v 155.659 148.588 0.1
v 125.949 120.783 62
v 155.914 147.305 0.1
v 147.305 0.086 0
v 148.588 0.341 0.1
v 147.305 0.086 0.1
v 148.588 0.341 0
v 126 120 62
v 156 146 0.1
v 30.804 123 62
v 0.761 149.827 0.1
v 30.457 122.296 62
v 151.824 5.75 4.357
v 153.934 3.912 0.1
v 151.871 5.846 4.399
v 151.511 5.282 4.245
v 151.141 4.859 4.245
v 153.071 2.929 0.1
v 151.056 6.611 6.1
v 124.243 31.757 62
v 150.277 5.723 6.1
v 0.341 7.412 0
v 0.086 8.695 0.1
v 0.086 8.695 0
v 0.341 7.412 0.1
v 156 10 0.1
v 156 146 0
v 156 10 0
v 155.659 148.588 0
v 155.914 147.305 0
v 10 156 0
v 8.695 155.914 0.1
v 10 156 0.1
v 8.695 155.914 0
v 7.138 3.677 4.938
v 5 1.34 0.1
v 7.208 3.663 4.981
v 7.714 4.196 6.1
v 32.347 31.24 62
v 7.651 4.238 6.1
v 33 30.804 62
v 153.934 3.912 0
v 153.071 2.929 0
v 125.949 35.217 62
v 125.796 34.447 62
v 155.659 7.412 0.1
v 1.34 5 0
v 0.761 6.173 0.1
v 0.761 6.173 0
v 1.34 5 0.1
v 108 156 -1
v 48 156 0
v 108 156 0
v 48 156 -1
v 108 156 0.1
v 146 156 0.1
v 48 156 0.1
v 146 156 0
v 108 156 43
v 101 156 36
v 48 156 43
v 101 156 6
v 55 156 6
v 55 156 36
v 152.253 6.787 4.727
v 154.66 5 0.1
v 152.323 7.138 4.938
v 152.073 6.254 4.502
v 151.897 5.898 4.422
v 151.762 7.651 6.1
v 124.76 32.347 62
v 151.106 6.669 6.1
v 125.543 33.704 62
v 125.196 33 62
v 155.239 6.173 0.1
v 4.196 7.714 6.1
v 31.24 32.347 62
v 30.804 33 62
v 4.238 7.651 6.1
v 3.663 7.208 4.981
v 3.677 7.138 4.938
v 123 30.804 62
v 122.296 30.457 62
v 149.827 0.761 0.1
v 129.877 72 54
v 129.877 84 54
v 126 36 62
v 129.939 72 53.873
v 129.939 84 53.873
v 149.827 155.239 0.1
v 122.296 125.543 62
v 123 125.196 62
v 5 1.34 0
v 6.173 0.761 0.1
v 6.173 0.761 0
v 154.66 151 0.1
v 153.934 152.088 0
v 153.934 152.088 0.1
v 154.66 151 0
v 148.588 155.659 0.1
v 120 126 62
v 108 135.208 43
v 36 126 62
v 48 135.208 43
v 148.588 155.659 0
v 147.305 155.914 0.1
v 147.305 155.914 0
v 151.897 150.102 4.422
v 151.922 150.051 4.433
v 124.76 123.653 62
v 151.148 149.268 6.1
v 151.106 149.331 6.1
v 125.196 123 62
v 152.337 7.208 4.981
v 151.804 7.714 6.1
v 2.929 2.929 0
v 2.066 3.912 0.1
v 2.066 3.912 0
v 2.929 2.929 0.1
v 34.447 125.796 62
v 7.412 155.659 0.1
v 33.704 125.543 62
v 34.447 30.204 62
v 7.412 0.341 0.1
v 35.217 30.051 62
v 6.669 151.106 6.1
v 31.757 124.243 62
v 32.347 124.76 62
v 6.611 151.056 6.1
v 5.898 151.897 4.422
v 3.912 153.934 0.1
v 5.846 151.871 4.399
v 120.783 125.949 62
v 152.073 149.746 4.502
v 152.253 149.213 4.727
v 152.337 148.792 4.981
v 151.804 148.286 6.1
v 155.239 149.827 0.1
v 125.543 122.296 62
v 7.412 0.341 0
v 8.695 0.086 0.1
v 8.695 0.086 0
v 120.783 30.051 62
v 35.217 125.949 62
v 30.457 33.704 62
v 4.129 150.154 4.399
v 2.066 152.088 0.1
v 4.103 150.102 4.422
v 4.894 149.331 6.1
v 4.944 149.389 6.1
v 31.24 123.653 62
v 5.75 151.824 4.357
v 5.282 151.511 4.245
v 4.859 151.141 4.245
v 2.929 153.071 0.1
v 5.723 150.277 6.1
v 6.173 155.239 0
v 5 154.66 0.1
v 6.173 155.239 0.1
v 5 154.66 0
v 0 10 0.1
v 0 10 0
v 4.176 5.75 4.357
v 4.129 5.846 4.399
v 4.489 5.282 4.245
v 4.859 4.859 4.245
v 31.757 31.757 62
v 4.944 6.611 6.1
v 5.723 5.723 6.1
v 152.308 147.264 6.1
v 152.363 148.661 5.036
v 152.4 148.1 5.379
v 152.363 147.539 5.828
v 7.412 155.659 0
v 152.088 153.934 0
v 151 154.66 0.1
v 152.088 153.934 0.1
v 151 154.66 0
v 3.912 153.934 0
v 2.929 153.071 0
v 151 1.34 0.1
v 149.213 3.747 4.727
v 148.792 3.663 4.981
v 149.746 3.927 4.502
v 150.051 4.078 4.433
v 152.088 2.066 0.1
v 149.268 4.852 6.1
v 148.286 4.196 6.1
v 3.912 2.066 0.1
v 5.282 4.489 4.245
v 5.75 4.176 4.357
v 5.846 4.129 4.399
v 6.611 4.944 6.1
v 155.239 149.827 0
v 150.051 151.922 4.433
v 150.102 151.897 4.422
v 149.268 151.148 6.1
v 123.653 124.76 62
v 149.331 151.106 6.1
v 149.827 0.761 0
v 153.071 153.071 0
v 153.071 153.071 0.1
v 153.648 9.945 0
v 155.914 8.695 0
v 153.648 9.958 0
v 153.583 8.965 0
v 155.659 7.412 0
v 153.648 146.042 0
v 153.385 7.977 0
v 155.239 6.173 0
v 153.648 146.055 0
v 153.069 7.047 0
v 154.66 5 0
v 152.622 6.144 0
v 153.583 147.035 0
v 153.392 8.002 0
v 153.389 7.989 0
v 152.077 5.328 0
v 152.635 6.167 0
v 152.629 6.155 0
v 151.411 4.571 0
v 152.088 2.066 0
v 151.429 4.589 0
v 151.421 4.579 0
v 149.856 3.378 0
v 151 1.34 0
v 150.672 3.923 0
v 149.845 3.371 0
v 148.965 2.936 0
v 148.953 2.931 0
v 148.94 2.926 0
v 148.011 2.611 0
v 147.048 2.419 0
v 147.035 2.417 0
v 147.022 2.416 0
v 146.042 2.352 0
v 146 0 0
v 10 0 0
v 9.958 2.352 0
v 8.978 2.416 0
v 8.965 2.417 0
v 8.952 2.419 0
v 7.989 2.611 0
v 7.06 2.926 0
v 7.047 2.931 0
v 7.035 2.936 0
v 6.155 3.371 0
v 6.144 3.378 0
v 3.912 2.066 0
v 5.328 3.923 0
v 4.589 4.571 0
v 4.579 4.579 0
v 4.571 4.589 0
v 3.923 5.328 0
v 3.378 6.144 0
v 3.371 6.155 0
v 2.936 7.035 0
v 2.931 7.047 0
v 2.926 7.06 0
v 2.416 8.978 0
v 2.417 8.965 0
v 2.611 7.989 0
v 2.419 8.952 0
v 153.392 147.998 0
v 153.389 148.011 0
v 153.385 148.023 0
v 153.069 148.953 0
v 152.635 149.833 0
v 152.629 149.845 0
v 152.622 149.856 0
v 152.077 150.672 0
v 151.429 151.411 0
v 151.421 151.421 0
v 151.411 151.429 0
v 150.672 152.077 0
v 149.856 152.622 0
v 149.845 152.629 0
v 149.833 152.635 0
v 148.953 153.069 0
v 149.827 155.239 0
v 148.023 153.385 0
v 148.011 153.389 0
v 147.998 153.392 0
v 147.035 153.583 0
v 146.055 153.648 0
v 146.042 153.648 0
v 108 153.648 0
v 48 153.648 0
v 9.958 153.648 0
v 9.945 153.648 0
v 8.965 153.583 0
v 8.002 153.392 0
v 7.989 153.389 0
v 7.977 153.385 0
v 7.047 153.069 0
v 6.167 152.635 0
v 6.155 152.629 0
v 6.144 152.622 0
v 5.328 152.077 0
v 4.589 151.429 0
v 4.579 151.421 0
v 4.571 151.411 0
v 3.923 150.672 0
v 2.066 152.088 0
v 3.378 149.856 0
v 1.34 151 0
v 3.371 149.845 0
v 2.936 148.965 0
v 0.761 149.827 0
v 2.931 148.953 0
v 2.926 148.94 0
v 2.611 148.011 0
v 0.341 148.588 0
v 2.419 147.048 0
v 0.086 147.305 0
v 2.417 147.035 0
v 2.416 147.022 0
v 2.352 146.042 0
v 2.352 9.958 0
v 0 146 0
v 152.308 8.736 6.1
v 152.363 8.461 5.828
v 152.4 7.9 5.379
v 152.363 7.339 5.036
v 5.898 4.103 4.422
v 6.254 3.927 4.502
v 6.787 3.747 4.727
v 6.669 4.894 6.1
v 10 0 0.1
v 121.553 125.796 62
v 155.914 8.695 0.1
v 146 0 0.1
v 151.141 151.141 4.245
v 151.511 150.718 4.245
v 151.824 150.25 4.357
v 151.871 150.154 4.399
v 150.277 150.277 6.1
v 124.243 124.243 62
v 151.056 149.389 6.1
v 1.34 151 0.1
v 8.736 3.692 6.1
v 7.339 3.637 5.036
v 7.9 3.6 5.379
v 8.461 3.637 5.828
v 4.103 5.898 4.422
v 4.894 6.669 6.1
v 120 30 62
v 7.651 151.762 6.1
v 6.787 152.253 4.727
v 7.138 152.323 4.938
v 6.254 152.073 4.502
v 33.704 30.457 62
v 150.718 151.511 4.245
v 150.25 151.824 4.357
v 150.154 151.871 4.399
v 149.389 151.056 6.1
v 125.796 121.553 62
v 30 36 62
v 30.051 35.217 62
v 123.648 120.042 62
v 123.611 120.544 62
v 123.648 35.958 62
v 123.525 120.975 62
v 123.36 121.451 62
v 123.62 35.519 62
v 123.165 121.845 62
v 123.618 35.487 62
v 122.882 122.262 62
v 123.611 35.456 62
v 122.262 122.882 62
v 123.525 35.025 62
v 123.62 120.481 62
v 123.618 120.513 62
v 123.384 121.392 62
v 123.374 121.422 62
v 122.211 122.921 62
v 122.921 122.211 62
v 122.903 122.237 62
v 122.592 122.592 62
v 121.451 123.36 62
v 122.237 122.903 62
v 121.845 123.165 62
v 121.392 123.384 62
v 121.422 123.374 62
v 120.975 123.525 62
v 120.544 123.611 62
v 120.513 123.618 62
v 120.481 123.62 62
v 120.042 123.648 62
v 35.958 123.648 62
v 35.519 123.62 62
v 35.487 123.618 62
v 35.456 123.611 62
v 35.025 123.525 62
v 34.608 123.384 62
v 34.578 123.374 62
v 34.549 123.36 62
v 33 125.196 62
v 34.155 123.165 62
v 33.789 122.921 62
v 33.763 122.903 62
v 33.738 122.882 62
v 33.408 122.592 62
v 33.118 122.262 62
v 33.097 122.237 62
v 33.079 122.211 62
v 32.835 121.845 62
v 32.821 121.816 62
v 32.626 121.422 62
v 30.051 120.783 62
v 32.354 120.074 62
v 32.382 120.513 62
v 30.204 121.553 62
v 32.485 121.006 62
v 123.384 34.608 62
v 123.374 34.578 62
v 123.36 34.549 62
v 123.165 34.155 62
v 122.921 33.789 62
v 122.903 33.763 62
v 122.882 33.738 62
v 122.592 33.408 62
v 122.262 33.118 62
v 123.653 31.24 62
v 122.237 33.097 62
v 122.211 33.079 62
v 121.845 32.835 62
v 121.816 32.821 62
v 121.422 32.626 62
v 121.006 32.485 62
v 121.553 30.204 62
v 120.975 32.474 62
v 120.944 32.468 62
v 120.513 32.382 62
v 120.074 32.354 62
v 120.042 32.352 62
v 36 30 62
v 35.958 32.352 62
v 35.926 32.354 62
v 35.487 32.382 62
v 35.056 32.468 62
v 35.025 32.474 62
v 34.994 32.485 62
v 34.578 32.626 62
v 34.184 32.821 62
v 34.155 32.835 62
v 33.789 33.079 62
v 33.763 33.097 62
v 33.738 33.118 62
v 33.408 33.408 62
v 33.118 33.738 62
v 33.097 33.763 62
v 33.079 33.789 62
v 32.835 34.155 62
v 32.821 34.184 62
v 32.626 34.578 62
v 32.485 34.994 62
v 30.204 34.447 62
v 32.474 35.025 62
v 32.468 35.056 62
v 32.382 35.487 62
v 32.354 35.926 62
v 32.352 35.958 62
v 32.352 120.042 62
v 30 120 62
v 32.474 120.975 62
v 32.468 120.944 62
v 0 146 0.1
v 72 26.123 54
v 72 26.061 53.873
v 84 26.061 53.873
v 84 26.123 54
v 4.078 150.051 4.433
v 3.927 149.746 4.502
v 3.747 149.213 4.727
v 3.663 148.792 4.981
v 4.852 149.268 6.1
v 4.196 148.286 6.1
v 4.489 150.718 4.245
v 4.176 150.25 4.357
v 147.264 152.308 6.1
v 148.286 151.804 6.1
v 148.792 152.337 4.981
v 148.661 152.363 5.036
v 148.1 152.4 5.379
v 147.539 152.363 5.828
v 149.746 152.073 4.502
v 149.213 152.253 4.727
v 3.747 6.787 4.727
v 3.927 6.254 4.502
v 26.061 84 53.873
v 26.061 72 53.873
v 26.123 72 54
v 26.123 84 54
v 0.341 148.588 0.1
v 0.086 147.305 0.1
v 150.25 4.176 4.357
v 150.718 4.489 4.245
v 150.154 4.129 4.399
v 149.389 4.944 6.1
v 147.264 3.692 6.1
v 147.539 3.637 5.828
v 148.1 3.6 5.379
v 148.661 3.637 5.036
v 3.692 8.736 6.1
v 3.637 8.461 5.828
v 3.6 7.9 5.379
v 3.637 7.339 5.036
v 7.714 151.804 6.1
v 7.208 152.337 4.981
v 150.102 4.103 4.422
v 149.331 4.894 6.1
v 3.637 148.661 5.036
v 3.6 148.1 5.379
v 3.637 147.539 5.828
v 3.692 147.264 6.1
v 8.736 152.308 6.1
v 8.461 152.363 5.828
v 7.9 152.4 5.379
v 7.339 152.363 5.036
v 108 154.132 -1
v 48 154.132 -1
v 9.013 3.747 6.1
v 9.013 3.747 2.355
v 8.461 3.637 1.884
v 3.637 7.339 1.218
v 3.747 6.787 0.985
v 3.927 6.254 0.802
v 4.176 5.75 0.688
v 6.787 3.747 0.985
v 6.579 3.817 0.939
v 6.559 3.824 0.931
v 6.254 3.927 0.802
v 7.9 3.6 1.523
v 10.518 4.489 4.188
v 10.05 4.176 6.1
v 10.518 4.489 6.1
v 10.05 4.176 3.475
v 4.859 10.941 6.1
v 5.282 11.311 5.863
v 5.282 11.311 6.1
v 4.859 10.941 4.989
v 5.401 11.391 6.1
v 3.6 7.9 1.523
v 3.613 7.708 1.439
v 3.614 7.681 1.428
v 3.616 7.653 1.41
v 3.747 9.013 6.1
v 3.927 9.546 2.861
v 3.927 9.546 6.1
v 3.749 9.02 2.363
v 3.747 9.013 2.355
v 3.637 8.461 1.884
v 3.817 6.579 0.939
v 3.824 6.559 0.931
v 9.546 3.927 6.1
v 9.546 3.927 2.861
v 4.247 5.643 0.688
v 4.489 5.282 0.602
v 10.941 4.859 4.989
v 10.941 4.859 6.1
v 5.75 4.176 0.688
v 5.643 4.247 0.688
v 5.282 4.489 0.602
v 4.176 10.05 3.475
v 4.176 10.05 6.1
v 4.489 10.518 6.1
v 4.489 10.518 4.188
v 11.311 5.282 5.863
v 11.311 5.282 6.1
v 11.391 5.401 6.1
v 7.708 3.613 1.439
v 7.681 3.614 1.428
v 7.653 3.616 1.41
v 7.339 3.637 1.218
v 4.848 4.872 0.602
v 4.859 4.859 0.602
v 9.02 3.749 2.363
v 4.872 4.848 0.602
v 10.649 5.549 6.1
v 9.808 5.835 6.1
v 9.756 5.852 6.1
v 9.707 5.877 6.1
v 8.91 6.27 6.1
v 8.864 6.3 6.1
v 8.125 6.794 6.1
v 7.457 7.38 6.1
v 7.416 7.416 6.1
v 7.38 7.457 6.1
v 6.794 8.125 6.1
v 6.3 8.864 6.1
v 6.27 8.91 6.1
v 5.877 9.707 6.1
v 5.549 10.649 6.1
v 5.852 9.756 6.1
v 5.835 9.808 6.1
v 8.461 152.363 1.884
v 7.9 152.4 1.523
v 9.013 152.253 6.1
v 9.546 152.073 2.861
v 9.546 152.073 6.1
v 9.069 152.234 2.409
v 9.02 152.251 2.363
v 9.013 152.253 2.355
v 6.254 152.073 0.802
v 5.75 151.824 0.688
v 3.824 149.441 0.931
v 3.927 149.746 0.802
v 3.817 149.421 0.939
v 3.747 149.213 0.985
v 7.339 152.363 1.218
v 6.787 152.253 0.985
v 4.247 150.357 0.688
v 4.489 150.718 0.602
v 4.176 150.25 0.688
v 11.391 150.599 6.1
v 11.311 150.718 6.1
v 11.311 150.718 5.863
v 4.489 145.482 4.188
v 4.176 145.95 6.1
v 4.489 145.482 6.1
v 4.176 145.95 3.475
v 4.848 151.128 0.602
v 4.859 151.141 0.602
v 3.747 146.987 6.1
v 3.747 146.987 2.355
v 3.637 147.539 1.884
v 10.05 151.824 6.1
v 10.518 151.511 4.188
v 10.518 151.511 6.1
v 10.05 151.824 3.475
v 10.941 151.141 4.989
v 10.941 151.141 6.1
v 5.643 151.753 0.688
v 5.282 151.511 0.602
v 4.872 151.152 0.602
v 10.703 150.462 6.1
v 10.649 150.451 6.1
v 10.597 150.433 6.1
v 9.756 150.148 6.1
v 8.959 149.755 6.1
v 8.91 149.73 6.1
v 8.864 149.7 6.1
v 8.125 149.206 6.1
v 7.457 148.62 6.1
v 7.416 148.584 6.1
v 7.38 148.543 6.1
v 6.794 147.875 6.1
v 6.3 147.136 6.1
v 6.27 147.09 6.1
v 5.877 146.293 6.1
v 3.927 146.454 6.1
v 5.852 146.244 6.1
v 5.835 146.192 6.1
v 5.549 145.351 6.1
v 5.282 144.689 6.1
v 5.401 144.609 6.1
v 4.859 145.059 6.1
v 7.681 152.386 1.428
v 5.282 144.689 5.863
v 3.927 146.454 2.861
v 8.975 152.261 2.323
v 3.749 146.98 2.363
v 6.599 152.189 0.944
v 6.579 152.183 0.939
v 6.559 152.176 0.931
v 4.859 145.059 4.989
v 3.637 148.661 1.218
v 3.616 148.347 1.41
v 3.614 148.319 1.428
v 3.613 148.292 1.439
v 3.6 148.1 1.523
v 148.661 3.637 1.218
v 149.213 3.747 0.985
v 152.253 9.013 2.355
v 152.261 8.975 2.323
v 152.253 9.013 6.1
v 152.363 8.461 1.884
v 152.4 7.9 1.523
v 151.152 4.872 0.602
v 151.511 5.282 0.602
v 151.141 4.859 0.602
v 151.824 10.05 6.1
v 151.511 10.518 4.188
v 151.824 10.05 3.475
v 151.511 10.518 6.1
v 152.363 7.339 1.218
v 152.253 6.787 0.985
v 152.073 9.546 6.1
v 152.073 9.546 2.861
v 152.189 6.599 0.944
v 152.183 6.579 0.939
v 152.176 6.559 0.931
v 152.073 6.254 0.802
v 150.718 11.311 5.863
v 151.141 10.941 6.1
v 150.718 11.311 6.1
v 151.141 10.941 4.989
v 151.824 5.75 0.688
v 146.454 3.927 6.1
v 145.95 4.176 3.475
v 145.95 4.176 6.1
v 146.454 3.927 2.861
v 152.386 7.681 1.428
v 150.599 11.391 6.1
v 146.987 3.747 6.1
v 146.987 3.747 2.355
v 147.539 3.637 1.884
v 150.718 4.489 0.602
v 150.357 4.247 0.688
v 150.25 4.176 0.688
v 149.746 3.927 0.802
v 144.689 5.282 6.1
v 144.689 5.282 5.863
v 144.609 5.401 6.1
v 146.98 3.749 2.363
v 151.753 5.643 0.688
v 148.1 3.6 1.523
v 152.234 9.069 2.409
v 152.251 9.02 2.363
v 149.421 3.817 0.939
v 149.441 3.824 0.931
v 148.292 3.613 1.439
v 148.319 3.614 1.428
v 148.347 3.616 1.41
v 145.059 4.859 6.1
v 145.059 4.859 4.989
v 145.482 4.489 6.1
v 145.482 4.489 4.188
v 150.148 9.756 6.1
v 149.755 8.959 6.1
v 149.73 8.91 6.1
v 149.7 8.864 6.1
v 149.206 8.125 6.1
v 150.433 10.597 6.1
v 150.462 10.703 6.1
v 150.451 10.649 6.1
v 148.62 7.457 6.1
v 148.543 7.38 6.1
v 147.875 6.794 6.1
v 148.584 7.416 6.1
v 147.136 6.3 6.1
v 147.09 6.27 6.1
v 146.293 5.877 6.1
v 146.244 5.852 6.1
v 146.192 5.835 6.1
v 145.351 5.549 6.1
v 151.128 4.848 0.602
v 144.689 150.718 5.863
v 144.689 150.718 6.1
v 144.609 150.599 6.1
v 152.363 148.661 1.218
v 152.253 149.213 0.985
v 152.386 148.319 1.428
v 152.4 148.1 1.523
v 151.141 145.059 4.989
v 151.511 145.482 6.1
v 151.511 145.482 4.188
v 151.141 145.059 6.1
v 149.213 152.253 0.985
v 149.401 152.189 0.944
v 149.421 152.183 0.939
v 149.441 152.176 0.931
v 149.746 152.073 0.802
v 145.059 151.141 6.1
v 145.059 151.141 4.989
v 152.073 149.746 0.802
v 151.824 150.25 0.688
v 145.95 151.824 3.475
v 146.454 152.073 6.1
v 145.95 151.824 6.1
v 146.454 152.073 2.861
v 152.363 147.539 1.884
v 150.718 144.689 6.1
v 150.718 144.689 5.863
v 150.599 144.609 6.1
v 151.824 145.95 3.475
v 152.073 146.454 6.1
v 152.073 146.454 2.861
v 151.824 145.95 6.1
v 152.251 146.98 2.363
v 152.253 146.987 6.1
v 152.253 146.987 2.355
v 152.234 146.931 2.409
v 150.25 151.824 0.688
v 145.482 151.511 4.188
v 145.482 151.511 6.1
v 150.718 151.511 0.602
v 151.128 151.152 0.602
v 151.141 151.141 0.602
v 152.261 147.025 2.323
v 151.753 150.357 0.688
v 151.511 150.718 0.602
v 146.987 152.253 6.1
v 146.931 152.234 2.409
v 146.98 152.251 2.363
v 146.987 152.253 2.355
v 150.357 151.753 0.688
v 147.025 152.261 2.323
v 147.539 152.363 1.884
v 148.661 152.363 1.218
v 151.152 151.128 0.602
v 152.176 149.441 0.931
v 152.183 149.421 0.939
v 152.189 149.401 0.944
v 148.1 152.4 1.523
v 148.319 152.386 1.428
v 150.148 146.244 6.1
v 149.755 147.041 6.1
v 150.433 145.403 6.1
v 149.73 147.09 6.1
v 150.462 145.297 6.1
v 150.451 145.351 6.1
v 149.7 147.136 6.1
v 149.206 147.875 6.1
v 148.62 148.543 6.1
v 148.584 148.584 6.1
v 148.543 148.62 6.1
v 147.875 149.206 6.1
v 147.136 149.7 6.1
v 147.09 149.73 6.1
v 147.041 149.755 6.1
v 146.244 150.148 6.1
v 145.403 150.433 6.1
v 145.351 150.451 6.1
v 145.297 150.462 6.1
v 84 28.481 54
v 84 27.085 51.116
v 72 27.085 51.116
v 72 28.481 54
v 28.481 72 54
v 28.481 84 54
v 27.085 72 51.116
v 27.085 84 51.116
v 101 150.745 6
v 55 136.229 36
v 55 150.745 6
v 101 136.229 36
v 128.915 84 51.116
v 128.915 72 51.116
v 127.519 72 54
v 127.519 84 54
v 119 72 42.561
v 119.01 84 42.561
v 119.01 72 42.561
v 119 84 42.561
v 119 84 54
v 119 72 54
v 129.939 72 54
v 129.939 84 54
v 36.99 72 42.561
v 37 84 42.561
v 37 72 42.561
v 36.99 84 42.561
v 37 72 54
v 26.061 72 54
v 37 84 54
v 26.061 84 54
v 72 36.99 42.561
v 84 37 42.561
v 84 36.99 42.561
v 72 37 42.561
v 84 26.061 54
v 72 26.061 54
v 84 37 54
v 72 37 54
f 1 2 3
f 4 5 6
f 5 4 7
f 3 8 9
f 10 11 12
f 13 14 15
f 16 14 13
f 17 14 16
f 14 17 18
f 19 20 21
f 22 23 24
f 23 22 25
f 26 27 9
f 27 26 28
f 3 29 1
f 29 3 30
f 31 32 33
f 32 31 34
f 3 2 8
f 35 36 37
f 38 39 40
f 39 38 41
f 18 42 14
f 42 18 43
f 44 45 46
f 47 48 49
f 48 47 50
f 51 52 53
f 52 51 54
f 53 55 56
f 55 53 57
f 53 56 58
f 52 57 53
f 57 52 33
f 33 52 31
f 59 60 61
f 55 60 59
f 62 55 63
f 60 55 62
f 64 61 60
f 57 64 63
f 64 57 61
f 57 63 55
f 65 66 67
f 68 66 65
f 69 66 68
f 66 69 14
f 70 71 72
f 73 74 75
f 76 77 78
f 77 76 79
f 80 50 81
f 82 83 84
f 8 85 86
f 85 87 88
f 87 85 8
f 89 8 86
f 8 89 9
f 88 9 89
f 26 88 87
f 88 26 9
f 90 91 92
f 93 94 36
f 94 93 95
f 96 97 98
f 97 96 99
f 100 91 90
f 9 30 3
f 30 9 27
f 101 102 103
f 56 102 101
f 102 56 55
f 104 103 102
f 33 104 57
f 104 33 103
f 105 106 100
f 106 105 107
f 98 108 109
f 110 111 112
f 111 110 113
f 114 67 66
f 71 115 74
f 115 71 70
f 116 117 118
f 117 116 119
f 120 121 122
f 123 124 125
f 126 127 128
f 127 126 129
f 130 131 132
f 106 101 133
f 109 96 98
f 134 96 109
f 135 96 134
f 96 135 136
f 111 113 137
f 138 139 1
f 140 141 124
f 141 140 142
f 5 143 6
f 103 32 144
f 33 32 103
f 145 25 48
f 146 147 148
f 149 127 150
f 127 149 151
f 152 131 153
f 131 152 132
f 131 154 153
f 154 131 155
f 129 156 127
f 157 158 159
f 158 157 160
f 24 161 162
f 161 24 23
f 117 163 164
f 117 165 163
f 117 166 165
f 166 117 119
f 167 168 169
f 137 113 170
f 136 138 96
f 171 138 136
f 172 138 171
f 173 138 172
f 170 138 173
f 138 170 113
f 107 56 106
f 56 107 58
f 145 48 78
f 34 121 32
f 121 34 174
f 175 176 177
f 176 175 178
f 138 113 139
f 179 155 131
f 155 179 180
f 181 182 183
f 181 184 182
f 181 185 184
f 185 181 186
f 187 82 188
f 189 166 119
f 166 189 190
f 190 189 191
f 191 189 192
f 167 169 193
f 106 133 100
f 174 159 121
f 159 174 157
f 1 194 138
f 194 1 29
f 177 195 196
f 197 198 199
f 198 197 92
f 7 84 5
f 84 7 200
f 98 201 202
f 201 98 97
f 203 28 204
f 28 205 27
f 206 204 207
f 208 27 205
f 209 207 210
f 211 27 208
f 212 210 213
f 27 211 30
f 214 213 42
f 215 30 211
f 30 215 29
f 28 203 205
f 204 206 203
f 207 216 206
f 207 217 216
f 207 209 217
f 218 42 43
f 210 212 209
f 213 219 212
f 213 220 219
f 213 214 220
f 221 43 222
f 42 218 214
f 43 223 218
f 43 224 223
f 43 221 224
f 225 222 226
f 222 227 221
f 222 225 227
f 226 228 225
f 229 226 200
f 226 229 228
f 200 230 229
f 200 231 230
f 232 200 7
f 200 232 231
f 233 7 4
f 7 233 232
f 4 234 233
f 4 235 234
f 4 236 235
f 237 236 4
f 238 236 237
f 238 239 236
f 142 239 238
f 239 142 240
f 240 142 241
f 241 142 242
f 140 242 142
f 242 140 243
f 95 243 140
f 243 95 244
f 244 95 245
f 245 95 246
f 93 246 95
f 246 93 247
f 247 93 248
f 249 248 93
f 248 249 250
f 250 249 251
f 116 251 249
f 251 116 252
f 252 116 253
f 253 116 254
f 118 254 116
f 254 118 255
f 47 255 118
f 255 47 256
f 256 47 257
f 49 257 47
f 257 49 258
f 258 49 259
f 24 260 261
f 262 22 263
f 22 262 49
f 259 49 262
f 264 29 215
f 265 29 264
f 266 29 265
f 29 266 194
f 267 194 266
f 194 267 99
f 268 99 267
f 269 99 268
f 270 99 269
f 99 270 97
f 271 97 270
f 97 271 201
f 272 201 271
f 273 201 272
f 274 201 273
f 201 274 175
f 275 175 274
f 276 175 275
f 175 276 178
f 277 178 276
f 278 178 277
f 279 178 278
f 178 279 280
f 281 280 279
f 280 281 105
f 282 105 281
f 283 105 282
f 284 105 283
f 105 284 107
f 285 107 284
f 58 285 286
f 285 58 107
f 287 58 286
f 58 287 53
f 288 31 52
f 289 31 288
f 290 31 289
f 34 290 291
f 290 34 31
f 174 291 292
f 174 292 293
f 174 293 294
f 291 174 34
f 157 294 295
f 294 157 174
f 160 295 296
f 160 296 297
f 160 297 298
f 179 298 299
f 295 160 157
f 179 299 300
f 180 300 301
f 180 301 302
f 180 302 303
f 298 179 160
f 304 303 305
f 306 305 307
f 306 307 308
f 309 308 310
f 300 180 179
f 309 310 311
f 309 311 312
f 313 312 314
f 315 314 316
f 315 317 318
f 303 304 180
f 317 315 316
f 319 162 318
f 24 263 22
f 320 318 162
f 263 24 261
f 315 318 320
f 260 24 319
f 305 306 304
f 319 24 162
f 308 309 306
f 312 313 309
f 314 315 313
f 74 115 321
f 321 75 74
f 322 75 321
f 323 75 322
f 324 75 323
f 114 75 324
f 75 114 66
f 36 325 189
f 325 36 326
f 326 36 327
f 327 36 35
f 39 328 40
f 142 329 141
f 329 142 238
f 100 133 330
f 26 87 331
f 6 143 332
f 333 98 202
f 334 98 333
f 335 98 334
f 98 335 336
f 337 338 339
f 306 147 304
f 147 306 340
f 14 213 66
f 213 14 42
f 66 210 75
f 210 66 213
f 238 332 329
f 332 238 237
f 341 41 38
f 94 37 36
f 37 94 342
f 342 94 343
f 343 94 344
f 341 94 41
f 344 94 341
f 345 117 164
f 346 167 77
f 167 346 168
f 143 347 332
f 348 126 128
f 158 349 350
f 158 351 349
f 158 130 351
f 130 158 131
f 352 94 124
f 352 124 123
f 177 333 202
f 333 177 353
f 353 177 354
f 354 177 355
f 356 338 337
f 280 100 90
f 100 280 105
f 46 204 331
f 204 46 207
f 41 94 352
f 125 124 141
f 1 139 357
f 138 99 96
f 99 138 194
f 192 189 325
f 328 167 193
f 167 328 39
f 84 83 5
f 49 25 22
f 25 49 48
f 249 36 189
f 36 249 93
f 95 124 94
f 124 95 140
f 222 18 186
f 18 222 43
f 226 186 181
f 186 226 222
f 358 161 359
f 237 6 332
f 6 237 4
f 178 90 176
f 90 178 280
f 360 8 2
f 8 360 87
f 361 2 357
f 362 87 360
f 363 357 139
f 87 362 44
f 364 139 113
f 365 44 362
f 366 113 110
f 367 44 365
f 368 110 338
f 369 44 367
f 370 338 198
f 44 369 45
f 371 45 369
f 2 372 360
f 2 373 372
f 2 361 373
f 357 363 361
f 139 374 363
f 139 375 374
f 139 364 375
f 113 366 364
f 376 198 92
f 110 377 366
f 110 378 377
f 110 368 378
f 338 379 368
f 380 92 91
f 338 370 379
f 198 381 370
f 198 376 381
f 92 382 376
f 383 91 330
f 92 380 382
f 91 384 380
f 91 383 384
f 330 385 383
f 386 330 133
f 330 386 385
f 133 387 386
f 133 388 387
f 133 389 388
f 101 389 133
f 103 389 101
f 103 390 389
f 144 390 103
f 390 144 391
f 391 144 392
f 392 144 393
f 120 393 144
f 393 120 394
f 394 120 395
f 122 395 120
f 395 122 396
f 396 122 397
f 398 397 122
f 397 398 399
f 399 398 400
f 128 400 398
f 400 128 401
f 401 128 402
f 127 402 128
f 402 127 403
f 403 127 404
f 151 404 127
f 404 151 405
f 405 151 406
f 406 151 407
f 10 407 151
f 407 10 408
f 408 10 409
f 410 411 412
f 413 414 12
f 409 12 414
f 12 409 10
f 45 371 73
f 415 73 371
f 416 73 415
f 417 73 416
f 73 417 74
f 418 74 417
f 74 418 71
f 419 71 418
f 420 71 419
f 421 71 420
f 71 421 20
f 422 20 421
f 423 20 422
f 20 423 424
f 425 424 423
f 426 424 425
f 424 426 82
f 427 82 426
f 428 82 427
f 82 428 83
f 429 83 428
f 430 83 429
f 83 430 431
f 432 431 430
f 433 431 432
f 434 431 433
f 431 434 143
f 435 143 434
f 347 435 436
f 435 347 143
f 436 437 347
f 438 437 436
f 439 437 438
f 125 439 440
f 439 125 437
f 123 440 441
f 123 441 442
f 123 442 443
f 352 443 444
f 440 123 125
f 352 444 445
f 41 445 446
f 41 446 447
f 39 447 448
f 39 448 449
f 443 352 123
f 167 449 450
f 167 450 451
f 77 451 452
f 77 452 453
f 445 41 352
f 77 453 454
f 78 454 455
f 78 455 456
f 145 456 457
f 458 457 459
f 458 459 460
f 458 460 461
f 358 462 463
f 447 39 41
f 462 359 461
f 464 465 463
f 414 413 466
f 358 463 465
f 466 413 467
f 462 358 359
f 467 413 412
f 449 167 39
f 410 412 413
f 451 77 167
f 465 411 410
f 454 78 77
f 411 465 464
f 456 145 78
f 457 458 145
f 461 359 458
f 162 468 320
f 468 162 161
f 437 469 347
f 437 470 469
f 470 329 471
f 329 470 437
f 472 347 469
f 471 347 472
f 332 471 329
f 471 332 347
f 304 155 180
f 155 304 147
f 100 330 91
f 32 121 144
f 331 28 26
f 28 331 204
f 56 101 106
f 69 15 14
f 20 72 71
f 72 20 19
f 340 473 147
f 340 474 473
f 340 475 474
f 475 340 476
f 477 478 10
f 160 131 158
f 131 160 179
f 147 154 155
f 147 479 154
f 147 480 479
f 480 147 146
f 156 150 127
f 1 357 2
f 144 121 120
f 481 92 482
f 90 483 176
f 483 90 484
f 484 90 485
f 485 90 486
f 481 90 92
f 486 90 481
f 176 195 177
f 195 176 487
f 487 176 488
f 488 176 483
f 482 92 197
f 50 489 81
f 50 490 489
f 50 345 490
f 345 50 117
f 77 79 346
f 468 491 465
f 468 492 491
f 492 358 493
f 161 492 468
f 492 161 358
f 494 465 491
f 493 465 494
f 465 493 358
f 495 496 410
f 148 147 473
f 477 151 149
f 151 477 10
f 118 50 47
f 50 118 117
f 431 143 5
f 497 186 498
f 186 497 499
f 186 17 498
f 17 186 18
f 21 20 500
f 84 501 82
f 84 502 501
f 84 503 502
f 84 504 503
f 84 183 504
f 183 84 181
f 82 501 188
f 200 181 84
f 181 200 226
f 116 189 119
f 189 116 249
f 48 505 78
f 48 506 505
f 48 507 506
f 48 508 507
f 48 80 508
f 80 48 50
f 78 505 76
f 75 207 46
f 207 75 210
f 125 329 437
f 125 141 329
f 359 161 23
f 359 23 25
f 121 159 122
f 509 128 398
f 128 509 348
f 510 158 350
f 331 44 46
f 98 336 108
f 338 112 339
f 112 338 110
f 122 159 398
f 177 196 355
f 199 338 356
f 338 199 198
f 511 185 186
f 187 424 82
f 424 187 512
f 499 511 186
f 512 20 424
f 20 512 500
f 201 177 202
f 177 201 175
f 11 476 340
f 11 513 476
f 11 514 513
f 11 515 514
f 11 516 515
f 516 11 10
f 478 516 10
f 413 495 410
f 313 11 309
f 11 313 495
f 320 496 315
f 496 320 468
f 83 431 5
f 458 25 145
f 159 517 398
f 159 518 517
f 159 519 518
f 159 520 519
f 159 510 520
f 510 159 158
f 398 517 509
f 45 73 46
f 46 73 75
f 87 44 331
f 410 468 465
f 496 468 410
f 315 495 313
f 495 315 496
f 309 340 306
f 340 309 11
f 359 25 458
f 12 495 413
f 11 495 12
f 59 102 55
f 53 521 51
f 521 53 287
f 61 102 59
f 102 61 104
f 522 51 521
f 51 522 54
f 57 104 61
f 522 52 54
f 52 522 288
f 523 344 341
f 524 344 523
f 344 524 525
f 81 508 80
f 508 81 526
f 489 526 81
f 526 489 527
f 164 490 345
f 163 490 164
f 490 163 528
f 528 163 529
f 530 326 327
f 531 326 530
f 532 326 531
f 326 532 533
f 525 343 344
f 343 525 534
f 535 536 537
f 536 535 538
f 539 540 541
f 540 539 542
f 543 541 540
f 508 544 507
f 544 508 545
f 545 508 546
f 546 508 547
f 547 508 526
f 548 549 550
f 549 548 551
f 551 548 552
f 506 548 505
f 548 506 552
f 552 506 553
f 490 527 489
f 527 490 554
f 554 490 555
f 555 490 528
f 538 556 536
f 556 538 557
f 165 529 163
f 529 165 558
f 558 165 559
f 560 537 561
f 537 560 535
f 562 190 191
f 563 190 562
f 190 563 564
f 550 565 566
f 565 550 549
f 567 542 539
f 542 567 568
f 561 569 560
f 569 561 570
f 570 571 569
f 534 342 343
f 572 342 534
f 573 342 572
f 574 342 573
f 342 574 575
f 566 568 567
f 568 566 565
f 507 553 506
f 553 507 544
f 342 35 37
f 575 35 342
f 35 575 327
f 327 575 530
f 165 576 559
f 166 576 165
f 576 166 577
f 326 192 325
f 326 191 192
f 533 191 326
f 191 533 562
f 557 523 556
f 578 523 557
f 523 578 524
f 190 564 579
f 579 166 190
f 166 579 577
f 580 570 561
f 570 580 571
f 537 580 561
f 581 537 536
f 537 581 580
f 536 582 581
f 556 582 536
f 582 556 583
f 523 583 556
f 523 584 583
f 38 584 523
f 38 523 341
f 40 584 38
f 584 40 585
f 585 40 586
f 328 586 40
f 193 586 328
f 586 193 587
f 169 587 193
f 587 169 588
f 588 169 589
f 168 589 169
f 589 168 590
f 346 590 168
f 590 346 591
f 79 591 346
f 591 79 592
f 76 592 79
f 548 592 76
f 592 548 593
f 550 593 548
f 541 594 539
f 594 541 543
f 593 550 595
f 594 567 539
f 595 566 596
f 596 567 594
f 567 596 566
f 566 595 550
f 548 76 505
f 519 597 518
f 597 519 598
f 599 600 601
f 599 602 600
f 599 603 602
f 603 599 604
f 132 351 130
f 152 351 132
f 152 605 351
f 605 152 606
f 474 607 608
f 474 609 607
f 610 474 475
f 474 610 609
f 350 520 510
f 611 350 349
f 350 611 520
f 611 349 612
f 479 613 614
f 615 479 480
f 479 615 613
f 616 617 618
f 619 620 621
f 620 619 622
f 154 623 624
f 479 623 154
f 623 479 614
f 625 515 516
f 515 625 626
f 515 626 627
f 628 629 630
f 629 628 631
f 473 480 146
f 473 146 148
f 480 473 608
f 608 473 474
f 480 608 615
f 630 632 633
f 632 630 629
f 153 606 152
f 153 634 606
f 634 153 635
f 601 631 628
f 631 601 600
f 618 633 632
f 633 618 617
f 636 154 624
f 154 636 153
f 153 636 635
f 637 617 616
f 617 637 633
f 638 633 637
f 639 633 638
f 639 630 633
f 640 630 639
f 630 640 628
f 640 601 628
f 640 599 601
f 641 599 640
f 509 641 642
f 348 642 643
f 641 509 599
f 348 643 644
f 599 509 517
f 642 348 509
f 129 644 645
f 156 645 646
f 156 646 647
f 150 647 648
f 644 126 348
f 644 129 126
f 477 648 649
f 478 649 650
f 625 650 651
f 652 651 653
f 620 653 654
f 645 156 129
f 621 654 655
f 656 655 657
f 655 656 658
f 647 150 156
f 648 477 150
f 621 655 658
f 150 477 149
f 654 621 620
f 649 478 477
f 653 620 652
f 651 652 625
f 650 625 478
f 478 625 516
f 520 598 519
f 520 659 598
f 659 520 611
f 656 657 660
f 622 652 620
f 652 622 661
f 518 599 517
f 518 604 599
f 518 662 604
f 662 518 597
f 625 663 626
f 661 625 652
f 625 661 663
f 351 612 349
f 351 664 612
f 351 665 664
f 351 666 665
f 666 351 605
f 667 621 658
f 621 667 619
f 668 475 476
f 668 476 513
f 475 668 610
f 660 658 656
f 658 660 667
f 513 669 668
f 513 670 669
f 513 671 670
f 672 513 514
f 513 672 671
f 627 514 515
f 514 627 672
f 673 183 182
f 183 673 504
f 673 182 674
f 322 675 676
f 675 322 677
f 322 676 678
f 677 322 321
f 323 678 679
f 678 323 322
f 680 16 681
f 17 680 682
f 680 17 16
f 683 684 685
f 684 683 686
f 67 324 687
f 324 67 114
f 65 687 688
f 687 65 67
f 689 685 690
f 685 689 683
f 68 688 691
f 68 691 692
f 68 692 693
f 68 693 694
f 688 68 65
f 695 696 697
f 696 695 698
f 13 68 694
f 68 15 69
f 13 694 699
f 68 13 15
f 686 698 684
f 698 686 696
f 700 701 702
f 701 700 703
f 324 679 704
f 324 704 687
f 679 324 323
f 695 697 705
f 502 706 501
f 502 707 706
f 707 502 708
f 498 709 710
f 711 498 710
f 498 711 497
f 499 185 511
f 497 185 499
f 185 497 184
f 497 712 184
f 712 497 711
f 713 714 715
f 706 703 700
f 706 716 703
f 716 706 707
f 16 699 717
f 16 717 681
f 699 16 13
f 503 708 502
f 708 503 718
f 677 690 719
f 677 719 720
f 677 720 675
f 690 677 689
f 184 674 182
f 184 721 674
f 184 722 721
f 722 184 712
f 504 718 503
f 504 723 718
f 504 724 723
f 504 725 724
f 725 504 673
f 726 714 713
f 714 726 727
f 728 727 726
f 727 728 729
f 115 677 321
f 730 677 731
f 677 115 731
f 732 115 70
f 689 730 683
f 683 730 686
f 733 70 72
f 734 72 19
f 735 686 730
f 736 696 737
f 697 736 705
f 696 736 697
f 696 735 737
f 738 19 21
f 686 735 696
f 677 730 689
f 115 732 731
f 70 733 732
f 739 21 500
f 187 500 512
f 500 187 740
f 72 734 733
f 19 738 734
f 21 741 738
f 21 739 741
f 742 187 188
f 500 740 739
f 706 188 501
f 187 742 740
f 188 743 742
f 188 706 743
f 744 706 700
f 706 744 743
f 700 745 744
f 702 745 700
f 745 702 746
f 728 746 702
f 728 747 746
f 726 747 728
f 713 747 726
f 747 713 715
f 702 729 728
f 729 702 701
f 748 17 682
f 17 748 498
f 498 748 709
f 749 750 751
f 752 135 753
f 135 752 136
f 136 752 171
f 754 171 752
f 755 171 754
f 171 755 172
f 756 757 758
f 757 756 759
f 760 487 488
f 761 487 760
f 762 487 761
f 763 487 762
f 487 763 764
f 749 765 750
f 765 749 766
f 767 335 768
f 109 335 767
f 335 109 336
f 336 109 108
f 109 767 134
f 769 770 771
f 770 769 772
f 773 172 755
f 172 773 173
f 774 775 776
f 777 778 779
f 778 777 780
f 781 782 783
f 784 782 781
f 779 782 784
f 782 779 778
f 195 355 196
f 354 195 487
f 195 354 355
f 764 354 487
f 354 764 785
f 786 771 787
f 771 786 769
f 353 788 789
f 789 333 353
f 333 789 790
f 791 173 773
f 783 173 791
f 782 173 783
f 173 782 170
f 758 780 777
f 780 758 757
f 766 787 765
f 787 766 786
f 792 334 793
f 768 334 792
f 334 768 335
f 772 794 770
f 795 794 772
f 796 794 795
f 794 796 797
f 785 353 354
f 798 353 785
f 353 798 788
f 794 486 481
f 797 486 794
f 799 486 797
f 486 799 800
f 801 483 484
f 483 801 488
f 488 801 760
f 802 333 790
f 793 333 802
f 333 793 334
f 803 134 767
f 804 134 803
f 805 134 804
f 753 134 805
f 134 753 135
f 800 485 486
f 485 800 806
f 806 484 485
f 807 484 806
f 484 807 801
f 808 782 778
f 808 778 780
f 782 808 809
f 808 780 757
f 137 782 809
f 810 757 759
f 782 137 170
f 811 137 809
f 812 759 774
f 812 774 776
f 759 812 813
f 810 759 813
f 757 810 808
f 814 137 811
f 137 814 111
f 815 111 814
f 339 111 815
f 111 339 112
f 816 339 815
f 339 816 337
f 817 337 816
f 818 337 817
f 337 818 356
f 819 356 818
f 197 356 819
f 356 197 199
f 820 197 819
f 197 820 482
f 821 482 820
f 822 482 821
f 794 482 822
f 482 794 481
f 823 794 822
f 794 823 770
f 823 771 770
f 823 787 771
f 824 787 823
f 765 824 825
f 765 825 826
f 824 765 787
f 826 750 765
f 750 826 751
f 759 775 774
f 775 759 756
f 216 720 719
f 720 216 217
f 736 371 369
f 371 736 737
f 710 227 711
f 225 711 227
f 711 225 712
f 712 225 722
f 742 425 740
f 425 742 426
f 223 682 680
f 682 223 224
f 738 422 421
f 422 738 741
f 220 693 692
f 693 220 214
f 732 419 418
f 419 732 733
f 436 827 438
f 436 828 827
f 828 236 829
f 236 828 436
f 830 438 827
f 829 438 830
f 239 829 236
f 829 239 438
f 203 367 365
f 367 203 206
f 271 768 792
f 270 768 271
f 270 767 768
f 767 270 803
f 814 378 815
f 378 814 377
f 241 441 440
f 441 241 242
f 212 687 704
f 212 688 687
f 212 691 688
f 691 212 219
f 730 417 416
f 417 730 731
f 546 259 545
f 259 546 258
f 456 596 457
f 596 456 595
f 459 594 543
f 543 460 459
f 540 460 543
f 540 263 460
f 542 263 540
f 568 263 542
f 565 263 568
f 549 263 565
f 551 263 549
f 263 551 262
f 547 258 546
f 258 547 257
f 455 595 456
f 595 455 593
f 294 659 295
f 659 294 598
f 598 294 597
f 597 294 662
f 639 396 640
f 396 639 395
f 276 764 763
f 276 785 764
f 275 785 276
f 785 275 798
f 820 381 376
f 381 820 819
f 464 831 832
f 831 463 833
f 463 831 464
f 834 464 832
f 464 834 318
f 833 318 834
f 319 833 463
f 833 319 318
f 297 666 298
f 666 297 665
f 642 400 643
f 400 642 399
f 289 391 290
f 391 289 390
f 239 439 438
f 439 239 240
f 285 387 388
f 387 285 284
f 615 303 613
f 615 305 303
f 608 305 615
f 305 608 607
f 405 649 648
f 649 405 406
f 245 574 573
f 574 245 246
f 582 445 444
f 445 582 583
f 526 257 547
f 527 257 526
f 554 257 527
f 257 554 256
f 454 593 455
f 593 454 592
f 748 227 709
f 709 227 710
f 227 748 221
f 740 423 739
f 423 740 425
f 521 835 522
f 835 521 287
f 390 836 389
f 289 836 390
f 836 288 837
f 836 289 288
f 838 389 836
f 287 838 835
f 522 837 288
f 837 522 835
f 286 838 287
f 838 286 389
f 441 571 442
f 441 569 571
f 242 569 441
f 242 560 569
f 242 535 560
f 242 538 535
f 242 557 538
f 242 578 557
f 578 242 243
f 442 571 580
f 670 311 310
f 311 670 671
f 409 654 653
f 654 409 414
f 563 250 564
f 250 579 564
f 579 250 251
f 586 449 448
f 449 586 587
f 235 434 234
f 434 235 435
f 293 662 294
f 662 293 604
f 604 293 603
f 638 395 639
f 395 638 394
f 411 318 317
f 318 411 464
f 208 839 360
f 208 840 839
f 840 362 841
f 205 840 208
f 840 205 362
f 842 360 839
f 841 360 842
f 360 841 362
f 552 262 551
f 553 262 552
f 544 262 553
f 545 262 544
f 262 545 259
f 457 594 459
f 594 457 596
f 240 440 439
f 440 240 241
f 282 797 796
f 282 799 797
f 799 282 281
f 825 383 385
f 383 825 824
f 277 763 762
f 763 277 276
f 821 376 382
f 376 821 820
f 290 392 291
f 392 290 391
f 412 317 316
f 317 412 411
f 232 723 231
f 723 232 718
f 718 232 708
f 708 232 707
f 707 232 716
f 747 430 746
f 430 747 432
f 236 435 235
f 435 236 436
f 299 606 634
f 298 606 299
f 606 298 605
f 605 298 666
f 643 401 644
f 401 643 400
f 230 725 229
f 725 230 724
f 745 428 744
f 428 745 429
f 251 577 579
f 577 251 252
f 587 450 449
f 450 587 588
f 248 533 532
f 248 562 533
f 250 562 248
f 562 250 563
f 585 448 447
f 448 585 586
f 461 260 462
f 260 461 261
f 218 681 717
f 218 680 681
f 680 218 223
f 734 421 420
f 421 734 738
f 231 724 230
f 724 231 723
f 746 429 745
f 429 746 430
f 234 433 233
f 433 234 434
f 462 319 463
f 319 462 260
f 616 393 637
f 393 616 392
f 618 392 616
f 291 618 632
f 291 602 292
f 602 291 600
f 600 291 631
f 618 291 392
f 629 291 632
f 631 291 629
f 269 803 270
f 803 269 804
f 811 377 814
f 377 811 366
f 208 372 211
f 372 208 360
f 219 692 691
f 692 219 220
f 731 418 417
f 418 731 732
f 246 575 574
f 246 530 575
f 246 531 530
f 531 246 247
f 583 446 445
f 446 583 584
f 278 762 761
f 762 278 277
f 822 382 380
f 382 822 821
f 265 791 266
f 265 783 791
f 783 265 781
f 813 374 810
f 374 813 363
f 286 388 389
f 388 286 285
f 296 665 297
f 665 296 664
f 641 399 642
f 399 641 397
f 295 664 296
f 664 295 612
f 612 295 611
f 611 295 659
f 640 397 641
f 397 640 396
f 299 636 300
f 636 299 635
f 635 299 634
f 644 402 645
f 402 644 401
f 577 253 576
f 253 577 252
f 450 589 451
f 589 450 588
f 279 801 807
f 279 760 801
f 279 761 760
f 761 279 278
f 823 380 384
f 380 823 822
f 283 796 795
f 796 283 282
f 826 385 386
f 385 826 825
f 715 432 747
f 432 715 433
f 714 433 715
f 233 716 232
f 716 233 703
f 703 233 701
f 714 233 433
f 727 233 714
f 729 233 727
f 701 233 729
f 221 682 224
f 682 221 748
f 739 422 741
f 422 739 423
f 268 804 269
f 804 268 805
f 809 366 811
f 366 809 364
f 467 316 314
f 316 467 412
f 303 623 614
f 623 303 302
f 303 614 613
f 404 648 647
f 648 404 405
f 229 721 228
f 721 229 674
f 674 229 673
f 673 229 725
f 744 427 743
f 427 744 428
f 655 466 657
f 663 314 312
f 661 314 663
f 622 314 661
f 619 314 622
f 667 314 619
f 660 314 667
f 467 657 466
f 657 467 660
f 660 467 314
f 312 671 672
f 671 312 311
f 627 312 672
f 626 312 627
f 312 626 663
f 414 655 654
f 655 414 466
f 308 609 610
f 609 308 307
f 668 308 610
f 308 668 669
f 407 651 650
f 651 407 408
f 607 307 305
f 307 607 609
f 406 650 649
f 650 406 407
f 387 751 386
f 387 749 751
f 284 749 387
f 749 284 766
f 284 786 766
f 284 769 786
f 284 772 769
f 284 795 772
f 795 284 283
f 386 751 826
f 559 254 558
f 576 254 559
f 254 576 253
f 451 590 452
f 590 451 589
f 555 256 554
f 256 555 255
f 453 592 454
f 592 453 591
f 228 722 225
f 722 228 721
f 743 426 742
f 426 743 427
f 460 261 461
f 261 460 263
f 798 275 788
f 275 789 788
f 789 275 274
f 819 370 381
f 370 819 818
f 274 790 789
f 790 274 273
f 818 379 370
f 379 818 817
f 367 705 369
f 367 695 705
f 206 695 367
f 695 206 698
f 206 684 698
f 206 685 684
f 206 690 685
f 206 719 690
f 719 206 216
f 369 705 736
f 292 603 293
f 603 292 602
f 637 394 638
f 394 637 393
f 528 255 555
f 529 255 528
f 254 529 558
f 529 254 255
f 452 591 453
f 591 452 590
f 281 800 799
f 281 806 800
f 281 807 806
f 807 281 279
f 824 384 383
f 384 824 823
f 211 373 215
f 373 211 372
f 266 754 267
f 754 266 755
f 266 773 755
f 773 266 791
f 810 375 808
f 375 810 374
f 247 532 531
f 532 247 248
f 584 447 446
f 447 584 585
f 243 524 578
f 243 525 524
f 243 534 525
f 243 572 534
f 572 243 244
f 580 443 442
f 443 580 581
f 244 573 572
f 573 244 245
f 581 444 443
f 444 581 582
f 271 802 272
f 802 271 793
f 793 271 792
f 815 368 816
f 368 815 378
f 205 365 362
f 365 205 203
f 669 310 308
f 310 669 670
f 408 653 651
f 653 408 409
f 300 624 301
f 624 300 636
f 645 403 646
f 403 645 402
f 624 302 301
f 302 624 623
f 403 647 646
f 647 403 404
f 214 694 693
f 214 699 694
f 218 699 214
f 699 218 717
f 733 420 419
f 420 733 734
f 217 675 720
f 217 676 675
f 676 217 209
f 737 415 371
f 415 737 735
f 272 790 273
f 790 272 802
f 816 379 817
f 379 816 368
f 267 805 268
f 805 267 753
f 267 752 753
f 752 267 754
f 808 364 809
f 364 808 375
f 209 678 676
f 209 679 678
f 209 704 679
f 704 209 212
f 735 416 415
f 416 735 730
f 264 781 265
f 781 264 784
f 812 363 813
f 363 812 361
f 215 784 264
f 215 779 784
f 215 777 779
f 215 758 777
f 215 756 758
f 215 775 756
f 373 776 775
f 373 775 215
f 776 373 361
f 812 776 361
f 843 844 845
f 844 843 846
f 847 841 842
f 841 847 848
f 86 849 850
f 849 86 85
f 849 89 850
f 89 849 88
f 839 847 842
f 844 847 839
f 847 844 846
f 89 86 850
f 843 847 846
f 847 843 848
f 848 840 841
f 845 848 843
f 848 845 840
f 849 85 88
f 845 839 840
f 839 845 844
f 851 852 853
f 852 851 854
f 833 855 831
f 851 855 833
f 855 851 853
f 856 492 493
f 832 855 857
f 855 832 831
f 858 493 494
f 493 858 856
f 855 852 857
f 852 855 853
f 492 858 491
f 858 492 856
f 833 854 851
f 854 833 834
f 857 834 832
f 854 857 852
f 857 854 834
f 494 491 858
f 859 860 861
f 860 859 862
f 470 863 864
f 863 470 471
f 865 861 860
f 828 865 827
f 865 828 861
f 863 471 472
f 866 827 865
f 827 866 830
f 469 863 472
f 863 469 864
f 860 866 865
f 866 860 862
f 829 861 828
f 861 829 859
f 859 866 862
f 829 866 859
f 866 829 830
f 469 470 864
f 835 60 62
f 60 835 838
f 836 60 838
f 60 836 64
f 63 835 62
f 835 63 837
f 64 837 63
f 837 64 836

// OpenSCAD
// file: ../common.scad
/* =============================================================================
 * 智慧香爐 — 共用輔助模組
 * =============================================================================
 * 圓角方柱、倒角、通風柵格、螺柱、頂緣台階、定位榫。
 * 零件檔一律 include 本檔（會連帶帶進 params.scad）。
 * ============================================================================= */

include <params.scad>

// ═══════════════════════════════════════════════════════════════════════════
// 共用輔助模組
// ═══════════════════════════════════════════════════════════════════════════

// 圓角方柱：用 4 根圓柱做 hull，比 minkowski 快很多
module rrect(w, d, h, r) {
    hull() {
        for (x = [r, w - r], y = [r, d - r])
            translate([x, y, 0]) cylinder(h = h, r = r);
    }
}

// 圓角方柱（底緣倒角版）：改善首層附著並讓外型更柔和
module rrect_chamfered(w, d, h, r, c = CHAMFER) {
    union() {
        // 倒角裙邊
        hull() {
            for (x = [r, w - r], y = [r, d - r])
                translate([x, y, 0]) cylinder(h = c, r1 = r - c, r2 = r);
        }
        translate([0, 0, c]) rrect(w, d, h - c, r);
    }
}

// 螺柱座（含自攻底孔）。pilot 依板子自己的孔徑給，不是統一值。
module standoff(h = STANDOFF_H, pilot = M3_PILOT) {
    difference() {
        cylinder(h = h, d = standoff_od(pilot));
        translate([0, 0, -0.1]) cylinder(h = h + 0.2, d = pilot);
    }
}

// 通風柵格：一排長圓孔。用於側面進氣與感測器艙開口。
module vent_slots(n, slot_w, slot_h, pitch, depth) {
    for (i = [0 : n - 1])
        translate([i * pitch, 0, 0])
            hull() {
                translate([0, slot_h / 2 - slot_w / 2, 0])
                    cylinder(h = depth, d = slot_w, $fn = 16);
                translate([0, -slot_h / 2 + slot_w / 2, 0])
                    cylinder(h = depth, d = slot_w, $fn = 16);
            }
}

// 頂緣承接台階：讓定位榫有實體可坐，同時作為上層零件的落座面
module top_ledge(w, d, z, r) {
    translate([0, 0, z])
        difference() {
            translate([WALL, WALL, 0])
                rrect(w - WALL * 2, d - WALL * 2, LEDGE_H, r - WALL);
            translate([WALL + LEDGE_W, WALL + LEDGE_W, -0.1])
                rrect(w - (WALL + LEDGE_W) * 2, d - (WALL + LEDGE_W) * 2,
                      LEDGE_H + 0.2, max(r - WALL - LEDGE_W, 0.5));
        }
}

// 定位榫（公）：四角
module tenons_male(w, d, z) {
    for (x = [TENON_INSET, w - TENON_INSET], y = [TENON_INSET, d - TENON_INSET])
        translate([x, y, z])
            cylinder(h = TENON_H, d1 = TENON_D, d2 = TENON_D - 1.2);  // 帶錐度好插入
}

// 定位榫（母）：對應的孔
module tenons_female(w, d, z) {
    for (x = [TENON_INSET, w - TENON_INSET], y = [TENON_INSET, d - TENON_INSET])
        translate([x, y, z - 0.1])
            cylinder(h = TENON_H + 0.2, d = TENON_D + FIT * 2);
}
// main file
/* =============================================================================
 * 智慧香爐 — 零件：集煙罩
 * =============================================================================
 * 尺寸全部來自 ../params.scad，本檔不寫死任何數字。
 *
 * 單獨開這個檔（F5／F6）會直接看到這個零件；被 incense_burner.scad 以
 * ★use<>★ 引入時，檔尾的預覽呼叫不會執行——use 只帶進模組、不執行對方的
 * 頂層敘述，這正是「一檔一零件」又不污染組合件的作法。
 * ============================================================================= */

include <../common.scad>

// ═══════════════════════════════════════════════════════════════════════════
// 零件 3：集煙罩
// ═══════════════════════════════════════════════════════════════════════════
// ★列印方向：開口朝下倒印，全部斜面都變成自支撐★
module hood() {
    // ★凸耳必須在挖空之後才 union★ 寫進 difference 的 union 裡會被內腔吃掉——
    //   感測器艙的掛耳與卡槽就是這樣整組消失的（見 parts/sensor_pod.scad）。
    difference() {
        union() {
            hood_shell();
            hood_seat_tabs();
        }
        // 後方煙道出口（穿透墊台與罩壁）——★留在 hood() 裡★，
        // 這樣「煙道尺寸三處一致」的檢查 F 才看得到 DUCT_W/DUCT_H。
        translate([CHMB_W / 2 - DUCT_W / 2, CHMB_D - 30, DUCT_Z_HOOD])
            cube([DUCT_W, 40, DUCT_H]);
    }
}

module hood_shell() {
    // 錐面上任一高度的外輪廓寬度／圓角（線性內插）
    function w_at(z) = CHMB_W + (HOOD_TOP_W - CHMB_W) * z / HOOD_H;
    function r_at(z) = CORNER_R + (CORNER_R * 0.6 - CORNER_R) * z / HOOD_H;

    // 內腔上下各超出 OVER（全域定義，見檔頭「切穿用的超出量」）。
    // ★這裡踩過坑★ 原本內腔頂面停在 HOOD_H，與外殼頂面共平面，
    //   結果不是切穿而是留下一層退化頂蓋——投香口被封死。
    difference() {
        union() {
            // 外殼
            hull() {
                rrect(CHMB_W, CHMB_D, 0.1, CORNER_R);
                translate([(CHMB_W - HOOD_TOP_W) / 2, (CHMB_D - HOOD_TOP_W) / 2, HOOD_H - 0.1])
                    rrect(HOOD_TOP_W, HOOD_TOP_W, 0.1, CORNER_R * 0.6);
            }
            hood_pad();
        }

        // 內腔（沿同一錐度延伸到外殼之外）
        hull() {
            for (z = [-OVER, HOOD_H + OVER])
                let (w = w_at(z), r = max(r_at(z) - WALL, 0.5))
                    translate([(CHMB_W - w) / 2 + WALL, (CHMB_D - w) / 2 + WALL, z])
                        rrect(w - WALL * 2, w - WALL * 2, 0.1, r);
        }

        // 底面定位榫孔（母）
        tenons_female(CHMB_W, CHMB_D, 0);

    }
}

// 集煙罩背面的平面安裝墊台
// ★為什麼需要★ 罩子是錐面，風扇法蘭貼上去只會點接觸、漏氣。
//   墊台把安裝面拉回與燃燒艙後壁同一個垂直平面（y = CHMB_D）。
// 理香機構插孔板的承接凸耳（罩內四處）
// ★不做整圈台階★ 罩子是開口朝下倒印的，整圈台階等於一圈大面積懸空；
//   四個小凸耳＋45° 斜撐則是自支撐的。
// ★角度只能取「面中心」★ 罩子是圓角方形，45° 對角方向的牆比半寬遠得多，
//   凸耳伸到半寬就停在半空中（實測 Volumes 2 → 6，四個凸耳全浮空）。
//   取 0/180（左右）與 270（前），避開後方 90° 的煙道開口。三點足以承接圓板。
function w_at_(z) = CHMB_W + (HOOD_TOP_W - CHMB_W) * z / HOOD_H;
module hood_seat_tabs() {
    r_in = (w_at_(TIDY_SEAT_Z) - WALL * 2) / 2;      // 該高度的罩內半徑
    // ★內伸量要留給磁座★ 磁座吊在插孔板下方、直徑 TIDY_DECK_DIA，
    //   凸耳伸太進去就會撞到它（實測穿透 242mm³）。只進板緣內 1mm 就夠承接。
    reach = r_in - TIDY_PLATE_DIA / 2 + 1;
    for (a = [0, 180, 270])
        translate([CHMB_W / 2, CHMB_D / 2, TIDY_SEAT_Z])
            rotate([0, 0, a])
                translate([r_in - reach, -6, 0])
                    // 斜撐讓倒印時自支撐：下緣往內收 45°
                    hull() {
                        cube([reach + 1.5, 12, 2]);        // +1.5 埋進罩壁，確保併成一體
                        translate([0, 0, -reach])
                            cube([0.01, 12, 0.01]);
                    }
}

module hood_pad() {
    pw = DUCT_W + PAD_MARGIN * 2;
    ph = DUCT_H + PAD_MARGIN * 2;
    // 錐面在墊台範圍內最內縮的位置（開口上緣）
    y_inner = CHMB_D - (CHMB_D - HOOD_TOP_W) * (DUCT_Z_HOOD + ph) / HOOD_H / 2 - 2;
    translate([CHMB_W / 2 - pw / 2, y_inner, DUCT_Z_HOOD - PAD_MARGIN])
        cube([pw, CHMB_D - y_inner, ph]);
}

// ── 單獨開檔時的預覽（被 use<> 引入時不執行）──
hood();
